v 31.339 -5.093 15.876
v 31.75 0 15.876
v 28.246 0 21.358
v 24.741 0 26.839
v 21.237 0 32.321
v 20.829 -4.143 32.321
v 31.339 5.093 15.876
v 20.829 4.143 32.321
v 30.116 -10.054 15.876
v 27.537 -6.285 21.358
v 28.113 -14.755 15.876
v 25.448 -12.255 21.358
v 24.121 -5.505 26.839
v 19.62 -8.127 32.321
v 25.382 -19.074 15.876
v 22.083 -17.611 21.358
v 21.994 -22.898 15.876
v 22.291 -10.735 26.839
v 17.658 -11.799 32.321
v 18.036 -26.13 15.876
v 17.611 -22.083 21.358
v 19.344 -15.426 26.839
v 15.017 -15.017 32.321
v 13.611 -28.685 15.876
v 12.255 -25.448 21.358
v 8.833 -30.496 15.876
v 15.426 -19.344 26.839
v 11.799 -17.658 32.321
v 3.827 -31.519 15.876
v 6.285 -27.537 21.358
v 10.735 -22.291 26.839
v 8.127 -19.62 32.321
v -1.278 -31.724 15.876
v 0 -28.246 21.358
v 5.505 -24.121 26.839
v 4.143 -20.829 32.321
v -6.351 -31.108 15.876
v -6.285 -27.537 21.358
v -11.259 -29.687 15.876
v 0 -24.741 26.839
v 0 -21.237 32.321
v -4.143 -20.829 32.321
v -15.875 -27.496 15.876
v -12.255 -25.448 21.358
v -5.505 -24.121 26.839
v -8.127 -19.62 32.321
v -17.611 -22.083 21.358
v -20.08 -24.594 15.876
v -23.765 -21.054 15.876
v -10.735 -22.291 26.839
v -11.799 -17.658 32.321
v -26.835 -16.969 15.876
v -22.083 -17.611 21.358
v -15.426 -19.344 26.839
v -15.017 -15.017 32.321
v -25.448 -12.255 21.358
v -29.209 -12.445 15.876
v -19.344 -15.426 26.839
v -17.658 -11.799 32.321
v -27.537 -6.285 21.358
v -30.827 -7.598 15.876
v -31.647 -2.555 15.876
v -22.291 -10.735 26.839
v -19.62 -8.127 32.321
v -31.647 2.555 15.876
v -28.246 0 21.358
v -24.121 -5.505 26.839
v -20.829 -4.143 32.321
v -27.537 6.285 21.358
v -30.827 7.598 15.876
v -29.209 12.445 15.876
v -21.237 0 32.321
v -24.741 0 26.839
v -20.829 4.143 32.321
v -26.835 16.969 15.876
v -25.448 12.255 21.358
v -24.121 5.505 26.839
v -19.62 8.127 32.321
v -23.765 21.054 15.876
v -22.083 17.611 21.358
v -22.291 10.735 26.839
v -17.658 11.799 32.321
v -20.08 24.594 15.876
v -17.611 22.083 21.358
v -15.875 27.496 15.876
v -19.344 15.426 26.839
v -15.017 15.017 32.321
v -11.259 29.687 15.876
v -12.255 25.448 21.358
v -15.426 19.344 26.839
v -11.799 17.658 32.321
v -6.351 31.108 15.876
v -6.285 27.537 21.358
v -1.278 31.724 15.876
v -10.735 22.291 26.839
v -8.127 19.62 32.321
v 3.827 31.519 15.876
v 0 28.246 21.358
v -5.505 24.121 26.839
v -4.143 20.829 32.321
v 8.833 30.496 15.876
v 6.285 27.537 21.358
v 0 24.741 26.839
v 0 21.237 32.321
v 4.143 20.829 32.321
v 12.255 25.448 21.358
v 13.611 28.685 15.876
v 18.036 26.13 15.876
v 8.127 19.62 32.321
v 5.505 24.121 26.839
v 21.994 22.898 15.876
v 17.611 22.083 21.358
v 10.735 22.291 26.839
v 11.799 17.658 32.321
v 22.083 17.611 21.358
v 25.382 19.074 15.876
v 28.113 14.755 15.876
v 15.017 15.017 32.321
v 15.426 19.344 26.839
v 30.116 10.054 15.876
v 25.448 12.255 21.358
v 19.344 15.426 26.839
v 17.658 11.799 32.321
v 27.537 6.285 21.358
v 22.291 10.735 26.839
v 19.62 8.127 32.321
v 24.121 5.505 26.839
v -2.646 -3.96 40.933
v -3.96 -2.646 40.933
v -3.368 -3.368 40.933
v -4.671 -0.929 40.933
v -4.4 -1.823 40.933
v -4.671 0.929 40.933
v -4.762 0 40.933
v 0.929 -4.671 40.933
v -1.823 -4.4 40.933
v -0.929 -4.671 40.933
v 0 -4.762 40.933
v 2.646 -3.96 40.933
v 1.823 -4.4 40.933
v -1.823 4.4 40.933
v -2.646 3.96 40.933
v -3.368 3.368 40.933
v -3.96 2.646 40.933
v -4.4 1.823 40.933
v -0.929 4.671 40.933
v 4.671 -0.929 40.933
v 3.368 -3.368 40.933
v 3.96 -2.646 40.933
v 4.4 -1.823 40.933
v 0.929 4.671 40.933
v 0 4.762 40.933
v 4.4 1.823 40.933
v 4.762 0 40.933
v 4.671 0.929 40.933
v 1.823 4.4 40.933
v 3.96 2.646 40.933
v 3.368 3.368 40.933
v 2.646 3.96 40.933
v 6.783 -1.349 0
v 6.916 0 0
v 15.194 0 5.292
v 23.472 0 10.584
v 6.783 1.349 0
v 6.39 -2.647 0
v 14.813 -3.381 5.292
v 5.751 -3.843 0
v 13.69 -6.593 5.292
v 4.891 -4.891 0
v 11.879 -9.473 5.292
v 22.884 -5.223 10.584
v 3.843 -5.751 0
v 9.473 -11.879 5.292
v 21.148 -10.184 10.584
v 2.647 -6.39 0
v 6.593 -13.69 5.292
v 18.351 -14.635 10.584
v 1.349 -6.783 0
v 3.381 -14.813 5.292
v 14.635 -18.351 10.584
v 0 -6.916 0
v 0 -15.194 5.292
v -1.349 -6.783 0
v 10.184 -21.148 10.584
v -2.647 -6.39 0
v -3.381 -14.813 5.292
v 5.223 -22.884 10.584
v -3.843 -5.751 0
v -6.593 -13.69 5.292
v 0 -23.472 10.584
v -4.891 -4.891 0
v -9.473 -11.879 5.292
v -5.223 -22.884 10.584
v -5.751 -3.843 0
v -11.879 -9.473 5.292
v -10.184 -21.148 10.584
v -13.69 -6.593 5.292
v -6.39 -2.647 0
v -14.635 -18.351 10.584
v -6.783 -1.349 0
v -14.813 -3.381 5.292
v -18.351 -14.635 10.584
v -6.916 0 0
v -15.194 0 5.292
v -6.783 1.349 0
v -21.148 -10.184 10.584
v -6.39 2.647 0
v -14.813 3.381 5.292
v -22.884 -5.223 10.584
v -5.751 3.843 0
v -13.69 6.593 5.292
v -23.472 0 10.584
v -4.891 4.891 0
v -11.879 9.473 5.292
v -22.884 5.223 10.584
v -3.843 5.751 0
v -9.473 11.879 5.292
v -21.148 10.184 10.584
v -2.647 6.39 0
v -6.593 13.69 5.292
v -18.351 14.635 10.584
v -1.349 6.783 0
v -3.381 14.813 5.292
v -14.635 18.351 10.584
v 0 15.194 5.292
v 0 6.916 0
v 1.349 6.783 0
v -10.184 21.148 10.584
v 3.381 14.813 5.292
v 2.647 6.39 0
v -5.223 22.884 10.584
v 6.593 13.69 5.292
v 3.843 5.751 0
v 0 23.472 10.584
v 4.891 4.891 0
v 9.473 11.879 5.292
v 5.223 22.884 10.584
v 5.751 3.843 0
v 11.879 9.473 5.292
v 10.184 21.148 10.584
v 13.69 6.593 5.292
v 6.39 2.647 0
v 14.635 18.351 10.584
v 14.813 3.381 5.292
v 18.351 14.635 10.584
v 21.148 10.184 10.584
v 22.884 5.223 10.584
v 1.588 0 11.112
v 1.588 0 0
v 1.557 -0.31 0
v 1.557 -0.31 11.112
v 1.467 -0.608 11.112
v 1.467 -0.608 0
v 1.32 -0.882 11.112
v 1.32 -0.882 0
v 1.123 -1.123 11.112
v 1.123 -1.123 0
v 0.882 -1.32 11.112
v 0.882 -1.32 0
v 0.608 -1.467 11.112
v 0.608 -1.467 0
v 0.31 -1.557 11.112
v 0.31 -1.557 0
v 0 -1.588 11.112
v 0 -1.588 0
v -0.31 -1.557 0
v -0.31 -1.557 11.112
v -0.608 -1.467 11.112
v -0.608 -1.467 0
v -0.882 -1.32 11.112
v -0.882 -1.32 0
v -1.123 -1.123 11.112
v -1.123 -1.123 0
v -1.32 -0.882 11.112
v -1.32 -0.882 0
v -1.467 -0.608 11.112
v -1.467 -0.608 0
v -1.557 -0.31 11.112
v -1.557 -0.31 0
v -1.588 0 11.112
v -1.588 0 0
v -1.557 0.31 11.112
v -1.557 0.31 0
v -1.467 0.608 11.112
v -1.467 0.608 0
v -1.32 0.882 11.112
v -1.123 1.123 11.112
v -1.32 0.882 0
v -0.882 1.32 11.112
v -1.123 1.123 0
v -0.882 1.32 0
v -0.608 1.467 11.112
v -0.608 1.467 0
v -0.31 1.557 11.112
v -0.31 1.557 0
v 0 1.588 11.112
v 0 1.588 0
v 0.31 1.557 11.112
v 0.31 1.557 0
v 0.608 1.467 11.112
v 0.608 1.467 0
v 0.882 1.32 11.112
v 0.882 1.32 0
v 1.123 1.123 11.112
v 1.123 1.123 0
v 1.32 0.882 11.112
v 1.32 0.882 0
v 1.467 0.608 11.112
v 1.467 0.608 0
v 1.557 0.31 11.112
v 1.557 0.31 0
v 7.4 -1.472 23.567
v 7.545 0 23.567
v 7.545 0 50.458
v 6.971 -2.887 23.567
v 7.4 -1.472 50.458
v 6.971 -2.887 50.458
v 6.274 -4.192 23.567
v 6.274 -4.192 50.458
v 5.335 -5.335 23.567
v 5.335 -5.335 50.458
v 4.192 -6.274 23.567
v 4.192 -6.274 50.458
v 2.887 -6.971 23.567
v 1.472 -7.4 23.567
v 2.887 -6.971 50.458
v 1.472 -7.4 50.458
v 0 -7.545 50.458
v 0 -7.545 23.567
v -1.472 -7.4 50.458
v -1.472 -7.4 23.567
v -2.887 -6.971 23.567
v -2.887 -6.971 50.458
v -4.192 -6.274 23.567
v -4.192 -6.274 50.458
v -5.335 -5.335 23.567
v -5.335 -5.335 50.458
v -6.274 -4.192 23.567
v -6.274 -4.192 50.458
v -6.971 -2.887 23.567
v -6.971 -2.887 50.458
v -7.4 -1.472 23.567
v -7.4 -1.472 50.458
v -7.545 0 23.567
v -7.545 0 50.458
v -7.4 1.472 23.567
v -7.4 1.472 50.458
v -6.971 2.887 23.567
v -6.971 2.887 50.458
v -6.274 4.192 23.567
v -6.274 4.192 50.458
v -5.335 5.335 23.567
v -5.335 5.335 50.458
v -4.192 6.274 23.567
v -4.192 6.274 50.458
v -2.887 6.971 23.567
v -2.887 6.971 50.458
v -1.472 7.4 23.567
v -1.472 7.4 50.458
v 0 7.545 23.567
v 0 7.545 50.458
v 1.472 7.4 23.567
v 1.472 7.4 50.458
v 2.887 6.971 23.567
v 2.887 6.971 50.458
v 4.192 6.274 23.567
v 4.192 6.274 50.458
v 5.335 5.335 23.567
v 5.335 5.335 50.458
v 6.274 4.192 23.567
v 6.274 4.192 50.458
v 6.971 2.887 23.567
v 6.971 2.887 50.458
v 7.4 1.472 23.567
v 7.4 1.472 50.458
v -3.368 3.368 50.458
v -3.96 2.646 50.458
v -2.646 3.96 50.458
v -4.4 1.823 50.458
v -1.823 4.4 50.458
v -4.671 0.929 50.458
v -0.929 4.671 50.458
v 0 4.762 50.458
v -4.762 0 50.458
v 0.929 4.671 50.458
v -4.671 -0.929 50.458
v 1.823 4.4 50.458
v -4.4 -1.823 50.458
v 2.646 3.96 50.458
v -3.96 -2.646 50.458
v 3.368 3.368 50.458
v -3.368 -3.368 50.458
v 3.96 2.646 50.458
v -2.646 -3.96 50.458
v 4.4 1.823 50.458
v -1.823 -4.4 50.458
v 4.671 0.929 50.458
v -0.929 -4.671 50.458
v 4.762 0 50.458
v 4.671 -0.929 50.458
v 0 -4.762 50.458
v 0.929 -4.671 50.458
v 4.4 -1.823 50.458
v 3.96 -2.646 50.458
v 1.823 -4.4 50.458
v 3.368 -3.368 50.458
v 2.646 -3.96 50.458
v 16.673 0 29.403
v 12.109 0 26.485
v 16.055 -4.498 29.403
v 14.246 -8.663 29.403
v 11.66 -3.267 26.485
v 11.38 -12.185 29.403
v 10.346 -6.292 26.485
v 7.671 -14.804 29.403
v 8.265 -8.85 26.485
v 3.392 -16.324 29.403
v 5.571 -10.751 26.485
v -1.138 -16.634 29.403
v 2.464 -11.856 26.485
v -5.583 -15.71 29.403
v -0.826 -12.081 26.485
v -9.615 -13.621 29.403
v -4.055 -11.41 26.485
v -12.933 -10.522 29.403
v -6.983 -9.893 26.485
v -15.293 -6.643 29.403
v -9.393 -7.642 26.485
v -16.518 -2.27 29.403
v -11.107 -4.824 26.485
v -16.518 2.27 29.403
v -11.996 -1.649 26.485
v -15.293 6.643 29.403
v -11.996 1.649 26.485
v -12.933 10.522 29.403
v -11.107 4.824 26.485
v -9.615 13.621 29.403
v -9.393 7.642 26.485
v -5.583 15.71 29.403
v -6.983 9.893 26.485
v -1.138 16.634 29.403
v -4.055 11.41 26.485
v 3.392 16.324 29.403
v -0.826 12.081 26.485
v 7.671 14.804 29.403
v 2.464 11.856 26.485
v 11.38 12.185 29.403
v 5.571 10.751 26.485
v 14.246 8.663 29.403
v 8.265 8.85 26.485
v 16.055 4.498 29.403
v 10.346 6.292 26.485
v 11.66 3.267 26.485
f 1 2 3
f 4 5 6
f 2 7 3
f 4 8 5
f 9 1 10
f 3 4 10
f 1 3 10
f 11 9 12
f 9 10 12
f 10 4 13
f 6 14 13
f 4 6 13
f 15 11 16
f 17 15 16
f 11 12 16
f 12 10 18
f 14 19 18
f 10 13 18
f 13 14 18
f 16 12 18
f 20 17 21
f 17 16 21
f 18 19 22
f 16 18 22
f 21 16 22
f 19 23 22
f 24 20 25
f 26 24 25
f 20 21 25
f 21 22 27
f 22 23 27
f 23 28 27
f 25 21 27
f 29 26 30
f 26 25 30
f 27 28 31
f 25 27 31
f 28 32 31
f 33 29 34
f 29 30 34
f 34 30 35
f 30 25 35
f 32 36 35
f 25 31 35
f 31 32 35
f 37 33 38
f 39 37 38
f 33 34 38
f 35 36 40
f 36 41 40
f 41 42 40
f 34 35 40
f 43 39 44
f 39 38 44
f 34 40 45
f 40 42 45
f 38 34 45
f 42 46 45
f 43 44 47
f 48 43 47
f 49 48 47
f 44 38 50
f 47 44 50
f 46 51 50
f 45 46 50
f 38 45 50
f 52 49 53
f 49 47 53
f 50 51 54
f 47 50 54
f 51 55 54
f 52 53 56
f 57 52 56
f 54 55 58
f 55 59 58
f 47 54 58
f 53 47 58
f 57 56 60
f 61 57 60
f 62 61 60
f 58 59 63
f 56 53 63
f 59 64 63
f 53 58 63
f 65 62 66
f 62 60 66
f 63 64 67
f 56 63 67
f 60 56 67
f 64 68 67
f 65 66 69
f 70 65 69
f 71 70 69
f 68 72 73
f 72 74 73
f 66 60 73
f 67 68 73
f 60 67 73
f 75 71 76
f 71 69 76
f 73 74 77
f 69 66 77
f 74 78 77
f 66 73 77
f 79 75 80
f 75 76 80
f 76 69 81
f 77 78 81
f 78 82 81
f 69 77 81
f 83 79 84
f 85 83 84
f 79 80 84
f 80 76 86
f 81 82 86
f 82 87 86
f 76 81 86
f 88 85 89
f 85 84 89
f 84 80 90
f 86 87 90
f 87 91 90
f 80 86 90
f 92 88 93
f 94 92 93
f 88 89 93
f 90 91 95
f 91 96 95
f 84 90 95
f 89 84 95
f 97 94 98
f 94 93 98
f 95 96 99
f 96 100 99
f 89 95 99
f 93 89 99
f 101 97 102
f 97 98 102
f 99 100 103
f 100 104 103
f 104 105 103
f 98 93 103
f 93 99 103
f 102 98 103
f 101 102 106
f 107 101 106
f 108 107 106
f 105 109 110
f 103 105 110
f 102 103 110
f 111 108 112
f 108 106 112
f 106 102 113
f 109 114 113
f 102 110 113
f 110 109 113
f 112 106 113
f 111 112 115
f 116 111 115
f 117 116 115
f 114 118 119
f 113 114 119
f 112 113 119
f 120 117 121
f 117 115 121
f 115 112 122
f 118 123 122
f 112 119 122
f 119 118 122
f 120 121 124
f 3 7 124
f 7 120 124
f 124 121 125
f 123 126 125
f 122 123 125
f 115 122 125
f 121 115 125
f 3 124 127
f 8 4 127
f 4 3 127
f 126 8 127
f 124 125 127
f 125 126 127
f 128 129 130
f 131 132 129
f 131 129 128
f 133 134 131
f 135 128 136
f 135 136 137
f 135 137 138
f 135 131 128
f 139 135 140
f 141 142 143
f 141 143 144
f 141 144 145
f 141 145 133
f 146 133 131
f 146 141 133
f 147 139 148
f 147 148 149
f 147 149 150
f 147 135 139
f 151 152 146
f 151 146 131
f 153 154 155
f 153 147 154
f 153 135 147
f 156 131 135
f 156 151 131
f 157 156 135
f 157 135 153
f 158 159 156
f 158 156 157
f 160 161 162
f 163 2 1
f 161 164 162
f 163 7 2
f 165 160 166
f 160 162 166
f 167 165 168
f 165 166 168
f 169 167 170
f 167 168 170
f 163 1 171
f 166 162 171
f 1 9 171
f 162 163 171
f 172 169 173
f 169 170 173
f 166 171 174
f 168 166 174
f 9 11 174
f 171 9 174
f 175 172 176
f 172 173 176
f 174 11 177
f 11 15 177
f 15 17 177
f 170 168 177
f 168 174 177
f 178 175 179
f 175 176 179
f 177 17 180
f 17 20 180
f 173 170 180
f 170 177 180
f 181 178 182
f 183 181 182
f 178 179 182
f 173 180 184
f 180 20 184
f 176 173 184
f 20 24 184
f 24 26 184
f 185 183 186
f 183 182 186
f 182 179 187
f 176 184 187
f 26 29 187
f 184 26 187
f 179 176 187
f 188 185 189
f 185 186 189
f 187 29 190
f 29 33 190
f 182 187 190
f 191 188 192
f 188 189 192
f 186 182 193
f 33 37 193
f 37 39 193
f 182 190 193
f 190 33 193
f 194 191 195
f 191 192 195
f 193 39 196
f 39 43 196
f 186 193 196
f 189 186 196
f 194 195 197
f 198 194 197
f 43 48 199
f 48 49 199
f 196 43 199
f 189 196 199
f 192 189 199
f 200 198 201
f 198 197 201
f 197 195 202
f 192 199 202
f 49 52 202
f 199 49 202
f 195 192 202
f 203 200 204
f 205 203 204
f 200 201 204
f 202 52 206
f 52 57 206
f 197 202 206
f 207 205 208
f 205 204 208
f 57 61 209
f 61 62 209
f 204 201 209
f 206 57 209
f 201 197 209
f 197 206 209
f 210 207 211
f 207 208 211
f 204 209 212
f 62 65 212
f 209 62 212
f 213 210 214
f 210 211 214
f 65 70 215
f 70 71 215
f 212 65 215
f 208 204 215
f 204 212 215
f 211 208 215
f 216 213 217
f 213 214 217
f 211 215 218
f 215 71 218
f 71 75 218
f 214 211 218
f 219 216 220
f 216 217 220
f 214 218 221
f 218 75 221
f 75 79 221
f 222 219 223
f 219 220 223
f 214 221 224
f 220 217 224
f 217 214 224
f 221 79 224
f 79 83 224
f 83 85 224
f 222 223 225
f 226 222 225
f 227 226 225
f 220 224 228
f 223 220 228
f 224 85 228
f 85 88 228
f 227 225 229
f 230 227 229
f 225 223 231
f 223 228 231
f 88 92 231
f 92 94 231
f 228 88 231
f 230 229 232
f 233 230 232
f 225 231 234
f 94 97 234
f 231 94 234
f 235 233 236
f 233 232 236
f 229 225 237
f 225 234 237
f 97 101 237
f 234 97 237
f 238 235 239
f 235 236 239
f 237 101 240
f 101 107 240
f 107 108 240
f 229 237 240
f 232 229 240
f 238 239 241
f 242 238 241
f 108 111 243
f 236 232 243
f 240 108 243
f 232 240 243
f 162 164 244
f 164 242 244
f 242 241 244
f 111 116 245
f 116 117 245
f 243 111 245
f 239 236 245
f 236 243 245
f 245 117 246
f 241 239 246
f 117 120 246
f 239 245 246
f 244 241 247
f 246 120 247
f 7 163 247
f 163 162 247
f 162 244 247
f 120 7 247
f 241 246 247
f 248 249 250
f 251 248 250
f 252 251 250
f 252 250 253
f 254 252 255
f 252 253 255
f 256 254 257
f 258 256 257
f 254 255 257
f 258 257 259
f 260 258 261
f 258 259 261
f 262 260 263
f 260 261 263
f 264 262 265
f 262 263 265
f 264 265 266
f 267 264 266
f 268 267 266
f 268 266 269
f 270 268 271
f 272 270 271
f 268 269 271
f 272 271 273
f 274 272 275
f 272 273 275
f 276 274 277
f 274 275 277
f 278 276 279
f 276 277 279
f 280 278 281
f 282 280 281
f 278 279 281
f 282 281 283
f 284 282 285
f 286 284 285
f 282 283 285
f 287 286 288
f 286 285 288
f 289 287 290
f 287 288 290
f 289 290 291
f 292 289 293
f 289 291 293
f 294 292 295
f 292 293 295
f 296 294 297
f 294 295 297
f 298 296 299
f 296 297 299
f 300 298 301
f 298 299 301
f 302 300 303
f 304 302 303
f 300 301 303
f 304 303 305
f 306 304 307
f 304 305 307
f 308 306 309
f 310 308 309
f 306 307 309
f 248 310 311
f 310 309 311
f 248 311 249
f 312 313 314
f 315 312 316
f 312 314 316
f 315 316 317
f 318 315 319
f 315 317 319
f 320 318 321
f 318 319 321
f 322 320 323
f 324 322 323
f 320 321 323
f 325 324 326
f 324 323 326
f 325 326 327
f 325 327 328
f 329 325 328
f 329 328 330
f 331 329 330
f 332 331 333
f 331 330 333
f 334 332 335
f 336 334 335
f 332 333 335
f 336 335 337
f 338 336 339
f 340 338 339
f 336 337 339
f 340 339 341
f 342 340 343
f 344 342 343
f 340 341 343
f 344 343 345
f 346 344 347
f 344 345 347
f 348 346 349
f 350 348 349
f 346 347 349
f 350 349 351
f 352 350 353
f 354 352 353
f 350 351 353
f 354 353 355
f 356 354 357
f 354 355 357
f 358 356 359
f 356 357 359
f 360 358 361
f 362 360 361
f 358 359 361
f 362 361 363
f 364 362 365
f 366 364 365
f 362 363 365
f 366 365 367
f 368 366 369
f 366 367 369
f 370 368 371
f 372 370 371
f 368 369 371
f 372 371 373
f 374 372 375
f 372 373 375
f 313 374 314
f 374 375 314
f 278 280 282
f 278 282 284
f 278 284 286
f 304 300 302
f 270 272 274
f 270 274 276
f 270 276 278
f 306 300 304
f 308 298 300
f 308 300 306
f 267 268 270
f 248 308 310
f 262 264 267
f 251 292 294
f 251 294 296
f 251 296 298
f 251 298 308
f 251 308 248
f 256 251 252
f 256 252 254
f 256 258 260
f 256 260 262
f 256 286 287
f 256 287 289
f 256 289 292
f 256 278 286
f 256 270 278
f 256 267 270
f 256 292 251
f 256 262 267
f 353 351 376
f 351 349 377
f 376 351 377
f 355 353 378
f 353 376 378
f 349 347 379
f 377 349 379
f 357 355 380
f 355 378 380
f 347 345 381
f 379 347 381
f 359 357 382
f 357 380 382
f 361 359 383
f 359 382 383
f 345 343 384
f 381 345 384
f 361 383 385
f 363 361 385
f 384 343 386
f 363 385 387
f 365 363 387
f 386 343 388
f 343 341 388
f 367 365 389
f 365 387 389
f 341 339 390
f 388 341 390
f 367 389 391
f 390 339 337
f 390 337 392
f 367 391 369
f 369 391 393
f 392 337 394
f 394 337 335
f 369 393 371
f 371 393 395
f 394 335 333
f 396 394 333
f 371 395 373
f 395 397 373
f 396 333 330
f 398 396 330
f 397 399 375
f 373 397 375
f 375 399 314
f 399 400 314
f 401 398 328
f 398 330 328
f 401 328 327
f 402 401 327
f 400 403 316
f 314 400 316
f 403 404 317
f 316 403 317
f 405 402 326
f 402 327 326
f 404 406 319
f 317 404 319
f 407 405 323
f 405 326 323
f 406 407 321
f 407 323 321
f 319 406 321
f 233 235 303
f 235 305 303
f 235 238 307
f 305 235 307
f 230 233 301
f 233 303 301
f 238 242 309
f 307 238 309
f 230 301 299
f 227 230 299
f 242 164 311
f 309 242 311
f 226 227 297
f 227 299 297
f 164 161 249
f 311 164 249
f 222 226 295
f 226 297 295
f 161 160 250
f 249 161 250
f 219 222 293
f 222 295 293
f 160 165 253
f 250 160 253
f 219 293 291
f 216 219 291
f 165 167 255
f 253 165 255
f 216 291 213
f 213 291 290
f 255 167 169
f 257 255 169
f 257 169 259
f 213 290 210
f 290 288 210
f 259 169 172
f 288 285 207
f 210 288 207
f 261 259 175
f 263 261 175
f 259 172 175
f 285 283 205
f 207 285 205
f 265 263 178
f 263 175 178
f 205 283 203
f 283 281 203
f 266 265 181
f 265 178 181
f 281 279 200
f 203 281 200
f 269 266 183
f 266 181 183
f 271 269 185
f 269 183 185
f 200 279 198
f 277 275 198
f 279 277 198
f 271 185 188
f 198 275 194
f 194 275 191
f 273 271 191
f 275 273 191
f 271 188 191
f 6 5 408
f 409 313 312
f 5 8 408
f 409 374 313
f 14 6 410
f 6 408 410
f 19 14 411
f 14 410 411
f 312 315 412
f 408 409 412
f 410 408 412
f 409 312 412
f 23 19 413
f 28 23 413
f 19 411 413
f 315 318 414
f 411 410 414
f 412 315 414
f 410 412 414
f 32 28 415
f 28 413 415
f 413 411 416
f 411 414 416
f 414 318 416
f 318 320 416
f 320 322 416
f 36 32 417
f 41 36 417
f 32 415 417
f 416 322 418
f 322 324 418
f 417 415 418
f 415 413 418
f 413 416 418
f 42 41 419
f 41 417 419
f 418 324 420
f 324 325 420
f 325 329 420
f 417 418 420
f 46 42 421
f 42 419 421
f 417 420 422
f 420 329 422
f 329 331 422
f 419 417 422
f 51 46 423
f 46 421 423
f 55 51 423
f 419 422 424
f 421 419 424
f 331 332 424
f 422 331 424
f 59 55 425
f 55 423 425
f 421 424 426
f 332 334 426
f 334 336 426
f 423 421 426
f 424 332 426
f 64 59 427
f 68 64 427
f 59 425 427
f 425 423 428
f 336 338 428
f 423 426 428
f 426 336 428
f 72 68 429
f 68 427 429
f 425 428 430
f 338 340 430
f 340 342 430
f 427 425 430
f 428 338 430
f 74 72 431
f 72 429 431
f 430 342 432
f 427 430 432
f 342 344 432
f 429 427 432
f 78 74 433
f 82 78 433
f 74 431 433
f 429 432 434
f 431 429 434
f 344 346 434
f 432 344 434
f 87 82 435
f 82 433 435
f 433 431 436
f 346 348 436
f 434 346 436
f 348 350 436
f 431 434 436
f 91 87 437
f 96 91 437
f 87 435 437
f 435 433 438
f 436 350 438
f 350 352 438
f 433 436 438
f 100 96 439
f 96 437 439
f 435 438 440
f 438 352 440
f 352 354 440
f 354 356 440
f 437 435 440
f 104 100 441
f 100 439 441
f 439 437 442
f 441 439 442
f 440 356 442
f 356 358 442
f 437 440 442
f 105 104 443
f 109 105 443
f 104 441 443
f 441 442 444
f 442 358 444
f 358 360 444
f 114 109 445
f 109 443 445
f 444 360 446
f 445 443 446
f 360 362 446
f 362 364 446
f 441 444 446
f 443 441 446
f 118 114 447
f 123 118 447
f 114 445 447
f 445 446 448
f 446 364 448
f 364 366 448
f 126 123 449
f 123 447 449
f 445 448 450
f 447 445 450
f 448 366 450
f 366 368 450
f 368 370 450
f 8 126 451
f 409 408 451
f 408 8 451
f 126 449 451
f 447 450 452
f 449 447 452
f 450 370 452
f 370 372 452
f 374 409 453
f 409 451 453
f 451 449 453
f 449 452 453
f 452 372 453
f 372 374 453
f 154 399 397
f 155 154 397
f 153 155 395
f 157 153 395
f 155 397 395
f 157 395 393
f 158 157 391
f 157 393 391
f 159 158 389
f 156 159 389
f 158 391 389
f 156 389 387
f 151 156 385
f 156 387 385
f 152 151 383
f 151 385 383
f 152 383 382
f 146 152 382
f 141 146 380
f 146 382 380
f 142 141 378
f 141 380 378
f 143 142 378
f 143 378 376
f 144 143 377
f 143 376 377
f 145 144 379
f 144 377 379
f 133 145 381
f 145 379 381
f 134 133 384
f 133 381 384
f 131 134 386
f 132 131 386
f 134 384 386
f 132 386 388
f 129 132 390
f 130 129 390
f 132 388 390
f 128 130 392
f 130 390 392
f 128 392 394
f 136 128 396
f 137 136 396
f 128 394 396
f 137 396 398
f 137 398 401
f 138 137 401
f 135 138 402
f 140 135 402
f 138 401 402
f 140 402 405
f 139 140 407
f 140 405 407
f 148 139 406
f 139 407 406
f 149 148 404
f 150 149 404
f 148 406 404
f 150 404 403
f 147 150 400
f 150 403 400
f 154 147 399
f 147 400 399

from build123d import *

# Parameters (mm, degrees)
F2_R     = 1.5875
F3_DEPTH = 11.1125
F4_R     = 4.7625
F5_DEPTH = 9.525


with BuildPart() as f1:
    # F0 (on Front) → F1 (revolve)
    with BuildSketch(Plane.XZ):
        Polygon((0, 50.45817), (0, 0), (6.916383, 0), (31.75, 15.876247), (21.236976, 32.320713), (7.545146, 23.567463), (7.545146, 50.45817), align=None)
    revolve(axis=Axis((0, 0, 25.229085), (0, 0, -1)))

    # F2 (on face) → F3 (cut)
    with BuildSketch(Plane(origin=(0, 0, 0), x_dir=(1, 0, 0), z_dir=(0, 0, -1))):
        Circle(F2_R)
    extrude(amount=-F3_DEPTH, mode=Mode.SUBTRACT)

    # F4 (on face) → F5 (cut)
    with BuildSketch(Plane.XY.offset(50.45817)):
        Circle(F4_R)
    extrude(amount=-F5_DEPTH, mode=Mode.SUBTRACT)


solid = f1.part
